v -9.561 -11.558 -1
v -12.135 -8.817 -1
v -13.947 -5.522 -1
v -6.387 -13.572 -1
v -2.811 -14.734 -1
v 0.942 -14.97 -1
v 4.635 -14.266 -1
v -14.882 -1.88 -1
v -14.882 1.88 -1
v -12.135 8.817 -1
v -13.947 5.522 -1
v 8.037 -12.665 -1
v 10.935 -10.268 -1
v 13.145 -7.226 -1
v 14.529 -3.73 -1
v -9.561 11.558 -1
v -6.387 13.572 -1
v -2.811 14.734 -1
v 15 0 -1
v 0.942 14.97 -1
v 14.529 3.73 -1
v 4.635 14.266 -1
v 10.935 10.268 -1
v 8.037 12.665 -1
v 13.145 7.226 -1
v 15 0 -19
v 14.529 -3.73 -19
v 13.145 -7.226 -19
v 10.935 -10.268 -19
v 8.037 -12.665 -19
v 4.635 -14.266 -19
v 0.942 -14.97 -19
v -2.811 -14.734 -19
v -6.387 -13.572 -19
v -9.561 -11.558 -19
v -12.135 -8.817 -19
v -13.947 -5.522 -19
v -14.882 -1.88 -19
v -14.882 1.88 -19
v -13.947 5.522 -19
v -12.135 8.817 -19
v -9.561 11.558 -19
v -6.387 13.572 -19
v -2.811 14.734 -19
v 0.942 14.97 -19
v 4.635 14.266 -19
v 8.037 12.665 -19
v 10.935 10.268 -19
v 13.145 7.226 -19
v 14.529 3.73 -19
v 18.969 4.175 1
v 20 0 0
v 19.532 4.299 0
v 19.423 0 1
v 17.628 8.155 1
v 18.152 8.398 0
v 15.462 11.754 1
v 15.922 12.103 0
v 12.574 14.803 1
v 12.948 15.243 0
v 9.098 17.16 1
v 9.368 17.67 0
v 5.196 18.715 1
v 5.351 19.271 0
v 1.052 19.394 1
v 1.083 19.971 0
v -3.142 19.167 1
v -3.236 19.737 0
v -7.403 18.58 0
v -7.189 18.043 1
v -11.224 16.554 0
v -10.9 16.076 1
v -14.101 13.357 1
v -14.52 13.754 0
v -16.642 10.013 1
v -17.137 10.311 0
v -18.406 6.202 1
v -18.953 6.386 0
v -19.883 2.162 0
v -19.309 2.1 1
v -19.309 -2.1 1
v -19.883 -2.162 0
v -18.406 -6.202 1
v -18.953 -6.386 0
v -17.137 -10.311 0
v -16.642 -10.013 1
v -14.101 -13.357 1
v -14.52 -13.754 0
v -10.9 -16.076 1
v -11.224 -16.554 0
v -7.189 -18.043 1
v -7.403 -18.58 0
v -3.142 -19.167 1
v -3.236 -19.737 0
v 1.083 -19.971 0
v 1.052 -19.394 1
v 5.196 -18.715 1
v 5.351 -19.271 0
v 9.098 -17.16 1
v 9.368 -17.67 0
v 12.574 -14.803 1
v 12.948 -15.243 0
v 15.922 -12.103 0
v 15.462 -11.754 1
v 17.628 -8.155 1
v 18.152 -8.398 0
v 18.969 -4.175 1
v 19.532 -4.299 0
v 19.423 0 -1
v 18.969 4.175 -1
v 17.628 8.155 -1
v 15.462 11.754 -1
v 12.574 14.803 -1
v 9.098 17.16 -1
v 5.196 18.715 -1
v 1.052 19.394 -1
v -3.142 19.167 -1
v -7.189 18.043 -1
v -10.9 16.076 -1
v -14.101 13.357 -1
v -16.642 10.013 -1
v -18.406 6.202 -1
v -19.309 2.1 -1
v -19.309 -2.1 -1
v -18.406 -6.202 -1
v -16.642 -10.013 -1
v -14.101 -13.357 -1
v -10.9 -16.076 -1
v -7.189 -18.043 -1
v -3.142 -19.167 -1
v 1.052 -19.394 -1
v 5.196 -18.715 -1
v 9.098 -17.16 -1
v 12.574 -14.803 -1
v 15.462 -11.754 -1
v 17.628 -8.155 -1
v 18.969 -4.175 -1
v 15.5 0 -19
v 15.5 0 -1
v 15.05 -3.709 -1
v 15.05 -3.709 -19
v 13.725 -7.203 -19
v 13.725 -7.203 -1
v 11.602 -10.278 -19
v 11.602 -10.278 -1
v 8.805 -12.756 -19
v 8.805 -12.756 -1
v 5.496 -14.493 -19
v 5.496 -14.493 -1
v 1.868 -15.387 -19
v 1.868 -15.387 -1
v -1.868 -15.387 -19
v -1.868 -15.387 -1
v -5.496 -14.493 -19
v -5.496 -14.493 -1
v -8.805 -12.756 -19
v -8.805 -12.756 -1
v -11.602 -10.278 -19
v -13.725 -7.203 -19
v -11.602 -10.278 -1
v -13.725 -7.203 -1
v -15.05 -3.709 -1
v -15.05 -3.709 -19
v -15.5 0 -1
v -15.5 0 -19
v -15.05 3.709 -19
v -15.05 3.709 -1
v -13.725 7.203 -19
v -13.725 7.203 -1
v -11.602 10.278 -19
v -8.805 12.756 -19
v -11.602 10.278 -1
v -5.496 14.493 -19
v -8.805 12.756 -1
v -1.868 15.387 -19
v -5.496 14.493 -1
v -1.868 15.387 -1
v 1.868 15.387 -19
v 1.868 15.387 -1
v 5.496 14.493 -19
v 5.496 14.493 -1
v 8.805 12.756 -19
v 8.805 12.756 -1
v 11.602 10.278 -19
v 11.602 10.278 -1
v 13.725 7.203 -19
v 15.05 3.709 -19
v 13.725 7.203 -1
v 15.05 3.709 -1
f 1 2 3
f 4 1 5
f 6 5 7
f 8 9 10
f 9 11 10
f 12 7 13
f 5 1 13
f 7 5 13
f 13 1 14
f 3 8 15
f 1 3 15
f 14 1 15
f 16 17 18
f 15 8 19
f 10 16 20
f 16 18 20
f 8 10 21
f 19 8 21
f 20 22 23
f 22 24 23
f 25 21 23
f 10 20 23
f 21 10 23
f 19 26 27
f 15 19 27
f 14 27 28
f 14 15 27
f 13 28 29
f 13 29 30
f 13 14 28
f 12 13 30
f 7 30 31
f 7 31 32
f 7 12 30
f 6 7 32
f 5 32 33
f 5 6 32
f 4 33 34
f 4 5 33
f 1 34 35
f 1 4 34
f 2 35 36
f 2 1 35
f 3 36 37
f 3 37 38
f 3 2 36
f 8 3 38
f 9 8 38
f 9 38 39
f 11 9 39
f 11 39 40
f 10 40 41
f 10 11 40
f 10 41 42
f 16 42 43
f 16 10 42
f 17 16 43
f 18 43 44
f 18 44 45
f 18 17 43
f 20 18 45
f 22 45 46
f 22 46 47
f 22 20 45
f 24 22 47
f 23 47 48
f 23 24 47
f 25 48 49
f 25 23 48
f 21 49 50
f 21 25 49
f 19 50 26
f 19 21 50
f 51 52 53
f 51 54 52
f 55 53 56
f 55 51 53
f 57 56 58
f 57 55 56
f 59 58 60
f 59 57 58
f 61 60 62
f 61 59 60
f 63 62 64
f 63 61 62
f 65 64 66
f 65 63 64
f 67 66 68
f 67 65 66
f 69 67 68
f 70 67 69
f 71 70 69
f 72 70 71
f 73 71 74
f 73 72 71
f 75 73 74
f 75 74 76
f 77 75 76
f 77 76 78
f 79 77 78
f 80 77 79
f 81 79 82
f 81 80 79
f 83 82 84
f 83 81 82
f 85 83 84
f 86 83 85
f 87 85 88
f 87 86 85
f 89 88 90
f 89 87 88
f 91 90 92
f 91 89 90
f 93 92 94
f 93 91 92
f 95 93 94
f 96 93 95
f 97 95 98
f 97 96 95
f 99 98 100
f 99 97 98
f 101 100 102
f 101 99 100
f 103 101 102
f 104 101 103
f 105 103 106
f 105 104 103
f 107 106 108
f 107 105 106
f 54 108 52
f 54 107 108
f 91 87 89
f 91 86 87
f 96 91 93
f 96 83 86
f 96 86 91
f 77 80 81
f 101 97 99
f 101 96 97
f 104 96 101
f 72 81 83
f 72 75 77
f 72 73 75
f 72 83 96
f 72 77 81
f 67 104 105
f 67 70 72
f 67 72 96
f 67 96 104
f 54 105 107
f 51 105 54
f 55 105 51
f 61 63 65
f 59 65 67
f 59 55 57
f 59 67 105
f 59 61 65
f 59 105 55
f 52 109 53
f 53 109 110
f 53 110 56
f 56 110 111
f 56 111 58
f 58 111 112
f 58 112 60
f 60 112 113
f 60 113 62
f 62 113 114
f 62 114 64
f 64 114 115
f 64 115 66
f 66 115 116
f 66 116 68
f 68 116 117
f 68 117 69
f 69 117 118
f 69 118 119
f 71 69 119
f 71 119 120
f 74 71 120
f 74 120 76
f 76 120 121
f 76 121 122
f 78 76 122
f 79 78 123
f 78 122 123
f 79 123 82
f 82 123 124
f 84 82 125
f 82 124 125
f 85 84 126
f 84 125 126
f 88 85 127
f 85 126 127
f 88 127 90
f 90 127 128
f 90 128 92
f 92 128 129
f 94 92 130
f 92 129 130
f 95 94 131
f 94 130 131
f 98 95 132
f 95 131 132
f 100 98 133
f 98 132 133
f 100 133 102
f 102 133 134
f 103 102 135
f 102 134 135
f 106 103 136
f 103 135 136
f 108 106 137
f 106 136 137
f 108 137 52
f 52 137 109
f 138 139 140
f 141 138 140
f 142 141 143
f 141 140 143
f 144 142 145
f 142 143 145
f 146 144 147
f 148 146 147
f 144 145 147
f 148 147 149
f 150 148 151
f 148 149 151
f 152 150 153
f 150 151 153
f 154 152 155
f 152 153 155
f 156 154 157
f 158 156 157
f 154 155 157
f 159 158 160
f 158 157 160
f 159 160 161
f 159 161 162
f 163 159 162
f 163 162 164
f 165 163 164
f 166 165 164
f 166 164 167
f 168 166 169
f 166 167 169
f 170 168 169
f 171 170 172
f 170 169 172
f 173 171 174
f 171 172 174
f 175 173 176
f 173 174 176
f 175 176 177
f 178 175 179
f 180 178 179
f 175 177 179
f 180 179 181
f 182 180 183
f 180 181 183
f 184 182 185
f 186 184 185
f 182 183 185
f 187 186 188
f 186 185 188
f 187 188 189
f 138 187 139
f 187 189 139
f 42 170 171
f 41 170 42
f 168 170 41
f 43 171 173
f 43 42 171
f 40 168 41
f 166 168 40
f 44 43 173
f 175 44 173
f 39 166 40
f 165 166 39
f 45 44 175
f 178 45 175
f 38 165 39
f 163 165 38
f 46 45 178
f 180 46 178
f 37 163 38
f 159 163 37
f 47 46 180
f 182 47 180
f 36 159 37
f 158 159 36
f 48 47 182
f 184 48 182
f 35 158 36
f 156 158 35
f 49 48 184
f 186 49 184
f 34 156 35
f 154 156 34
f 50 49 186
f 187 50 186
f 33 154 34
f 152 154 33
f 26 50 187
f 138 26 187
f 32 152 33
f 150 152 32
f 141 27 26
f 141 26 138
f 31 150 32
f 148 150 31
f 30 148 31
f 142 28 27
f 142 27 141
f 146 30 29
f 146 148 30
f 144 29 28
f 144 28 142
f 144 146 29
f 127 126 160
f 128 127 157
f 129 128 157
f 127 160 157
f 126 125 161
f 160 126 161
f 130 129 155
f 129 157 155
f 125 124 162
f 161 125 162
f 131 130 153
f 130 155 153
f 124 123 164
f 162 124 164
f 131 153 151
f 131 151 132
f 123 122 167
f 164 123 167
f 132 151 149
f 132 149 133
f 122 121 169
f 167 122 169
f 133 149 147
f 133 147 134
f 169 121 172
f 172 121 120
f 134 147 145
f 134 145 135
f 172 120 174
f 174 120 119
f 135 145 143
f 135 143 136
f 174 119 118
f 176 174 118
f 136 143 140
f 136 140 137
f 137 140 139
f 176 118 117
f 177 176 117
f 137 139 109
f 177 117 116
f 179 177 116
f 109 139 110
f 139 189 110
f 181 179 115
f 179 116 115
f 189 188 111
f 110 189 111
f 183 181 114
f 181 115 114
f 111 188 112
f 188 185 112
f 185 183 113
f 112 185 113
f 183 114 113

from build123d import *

# Parameters (mm, degrees)
F0_R          = 20
F1_DEPTH      = 1
F1_TAPER      = 30
F1_DEPTH_BACK = 1
F1_TAPER_BACK = 30
F2_R          = 15.5
F2_R_2        = 15
F3_DEPTH      = 18


with BuildPart() as f1:
    # F0 (on Top) → F1 (new body, two sides)
    with BuildSketch(Plane.XY) as f1_sk:
        Circle(F0_R)
    extrude(amount=F1_DEPTH, taper=F1_TAPER)
    extrude(f1_sk.sketch, amount=-F1_DEPTH_BACK, taper=F1_TAPER_BACK)

    # F2 (on face) → F3 (join)
    with BuildSketch(Plane(origin=(0, 0, -1), x_dir=(1, 0, 0), z_dir=(0, 0, -1))):
        Circle(F2_R)
        Circle(F2_R_2, mode=Mode.SUBTRACT)
    extrude(amount=F3_DEPTH)


solid = f1.part
